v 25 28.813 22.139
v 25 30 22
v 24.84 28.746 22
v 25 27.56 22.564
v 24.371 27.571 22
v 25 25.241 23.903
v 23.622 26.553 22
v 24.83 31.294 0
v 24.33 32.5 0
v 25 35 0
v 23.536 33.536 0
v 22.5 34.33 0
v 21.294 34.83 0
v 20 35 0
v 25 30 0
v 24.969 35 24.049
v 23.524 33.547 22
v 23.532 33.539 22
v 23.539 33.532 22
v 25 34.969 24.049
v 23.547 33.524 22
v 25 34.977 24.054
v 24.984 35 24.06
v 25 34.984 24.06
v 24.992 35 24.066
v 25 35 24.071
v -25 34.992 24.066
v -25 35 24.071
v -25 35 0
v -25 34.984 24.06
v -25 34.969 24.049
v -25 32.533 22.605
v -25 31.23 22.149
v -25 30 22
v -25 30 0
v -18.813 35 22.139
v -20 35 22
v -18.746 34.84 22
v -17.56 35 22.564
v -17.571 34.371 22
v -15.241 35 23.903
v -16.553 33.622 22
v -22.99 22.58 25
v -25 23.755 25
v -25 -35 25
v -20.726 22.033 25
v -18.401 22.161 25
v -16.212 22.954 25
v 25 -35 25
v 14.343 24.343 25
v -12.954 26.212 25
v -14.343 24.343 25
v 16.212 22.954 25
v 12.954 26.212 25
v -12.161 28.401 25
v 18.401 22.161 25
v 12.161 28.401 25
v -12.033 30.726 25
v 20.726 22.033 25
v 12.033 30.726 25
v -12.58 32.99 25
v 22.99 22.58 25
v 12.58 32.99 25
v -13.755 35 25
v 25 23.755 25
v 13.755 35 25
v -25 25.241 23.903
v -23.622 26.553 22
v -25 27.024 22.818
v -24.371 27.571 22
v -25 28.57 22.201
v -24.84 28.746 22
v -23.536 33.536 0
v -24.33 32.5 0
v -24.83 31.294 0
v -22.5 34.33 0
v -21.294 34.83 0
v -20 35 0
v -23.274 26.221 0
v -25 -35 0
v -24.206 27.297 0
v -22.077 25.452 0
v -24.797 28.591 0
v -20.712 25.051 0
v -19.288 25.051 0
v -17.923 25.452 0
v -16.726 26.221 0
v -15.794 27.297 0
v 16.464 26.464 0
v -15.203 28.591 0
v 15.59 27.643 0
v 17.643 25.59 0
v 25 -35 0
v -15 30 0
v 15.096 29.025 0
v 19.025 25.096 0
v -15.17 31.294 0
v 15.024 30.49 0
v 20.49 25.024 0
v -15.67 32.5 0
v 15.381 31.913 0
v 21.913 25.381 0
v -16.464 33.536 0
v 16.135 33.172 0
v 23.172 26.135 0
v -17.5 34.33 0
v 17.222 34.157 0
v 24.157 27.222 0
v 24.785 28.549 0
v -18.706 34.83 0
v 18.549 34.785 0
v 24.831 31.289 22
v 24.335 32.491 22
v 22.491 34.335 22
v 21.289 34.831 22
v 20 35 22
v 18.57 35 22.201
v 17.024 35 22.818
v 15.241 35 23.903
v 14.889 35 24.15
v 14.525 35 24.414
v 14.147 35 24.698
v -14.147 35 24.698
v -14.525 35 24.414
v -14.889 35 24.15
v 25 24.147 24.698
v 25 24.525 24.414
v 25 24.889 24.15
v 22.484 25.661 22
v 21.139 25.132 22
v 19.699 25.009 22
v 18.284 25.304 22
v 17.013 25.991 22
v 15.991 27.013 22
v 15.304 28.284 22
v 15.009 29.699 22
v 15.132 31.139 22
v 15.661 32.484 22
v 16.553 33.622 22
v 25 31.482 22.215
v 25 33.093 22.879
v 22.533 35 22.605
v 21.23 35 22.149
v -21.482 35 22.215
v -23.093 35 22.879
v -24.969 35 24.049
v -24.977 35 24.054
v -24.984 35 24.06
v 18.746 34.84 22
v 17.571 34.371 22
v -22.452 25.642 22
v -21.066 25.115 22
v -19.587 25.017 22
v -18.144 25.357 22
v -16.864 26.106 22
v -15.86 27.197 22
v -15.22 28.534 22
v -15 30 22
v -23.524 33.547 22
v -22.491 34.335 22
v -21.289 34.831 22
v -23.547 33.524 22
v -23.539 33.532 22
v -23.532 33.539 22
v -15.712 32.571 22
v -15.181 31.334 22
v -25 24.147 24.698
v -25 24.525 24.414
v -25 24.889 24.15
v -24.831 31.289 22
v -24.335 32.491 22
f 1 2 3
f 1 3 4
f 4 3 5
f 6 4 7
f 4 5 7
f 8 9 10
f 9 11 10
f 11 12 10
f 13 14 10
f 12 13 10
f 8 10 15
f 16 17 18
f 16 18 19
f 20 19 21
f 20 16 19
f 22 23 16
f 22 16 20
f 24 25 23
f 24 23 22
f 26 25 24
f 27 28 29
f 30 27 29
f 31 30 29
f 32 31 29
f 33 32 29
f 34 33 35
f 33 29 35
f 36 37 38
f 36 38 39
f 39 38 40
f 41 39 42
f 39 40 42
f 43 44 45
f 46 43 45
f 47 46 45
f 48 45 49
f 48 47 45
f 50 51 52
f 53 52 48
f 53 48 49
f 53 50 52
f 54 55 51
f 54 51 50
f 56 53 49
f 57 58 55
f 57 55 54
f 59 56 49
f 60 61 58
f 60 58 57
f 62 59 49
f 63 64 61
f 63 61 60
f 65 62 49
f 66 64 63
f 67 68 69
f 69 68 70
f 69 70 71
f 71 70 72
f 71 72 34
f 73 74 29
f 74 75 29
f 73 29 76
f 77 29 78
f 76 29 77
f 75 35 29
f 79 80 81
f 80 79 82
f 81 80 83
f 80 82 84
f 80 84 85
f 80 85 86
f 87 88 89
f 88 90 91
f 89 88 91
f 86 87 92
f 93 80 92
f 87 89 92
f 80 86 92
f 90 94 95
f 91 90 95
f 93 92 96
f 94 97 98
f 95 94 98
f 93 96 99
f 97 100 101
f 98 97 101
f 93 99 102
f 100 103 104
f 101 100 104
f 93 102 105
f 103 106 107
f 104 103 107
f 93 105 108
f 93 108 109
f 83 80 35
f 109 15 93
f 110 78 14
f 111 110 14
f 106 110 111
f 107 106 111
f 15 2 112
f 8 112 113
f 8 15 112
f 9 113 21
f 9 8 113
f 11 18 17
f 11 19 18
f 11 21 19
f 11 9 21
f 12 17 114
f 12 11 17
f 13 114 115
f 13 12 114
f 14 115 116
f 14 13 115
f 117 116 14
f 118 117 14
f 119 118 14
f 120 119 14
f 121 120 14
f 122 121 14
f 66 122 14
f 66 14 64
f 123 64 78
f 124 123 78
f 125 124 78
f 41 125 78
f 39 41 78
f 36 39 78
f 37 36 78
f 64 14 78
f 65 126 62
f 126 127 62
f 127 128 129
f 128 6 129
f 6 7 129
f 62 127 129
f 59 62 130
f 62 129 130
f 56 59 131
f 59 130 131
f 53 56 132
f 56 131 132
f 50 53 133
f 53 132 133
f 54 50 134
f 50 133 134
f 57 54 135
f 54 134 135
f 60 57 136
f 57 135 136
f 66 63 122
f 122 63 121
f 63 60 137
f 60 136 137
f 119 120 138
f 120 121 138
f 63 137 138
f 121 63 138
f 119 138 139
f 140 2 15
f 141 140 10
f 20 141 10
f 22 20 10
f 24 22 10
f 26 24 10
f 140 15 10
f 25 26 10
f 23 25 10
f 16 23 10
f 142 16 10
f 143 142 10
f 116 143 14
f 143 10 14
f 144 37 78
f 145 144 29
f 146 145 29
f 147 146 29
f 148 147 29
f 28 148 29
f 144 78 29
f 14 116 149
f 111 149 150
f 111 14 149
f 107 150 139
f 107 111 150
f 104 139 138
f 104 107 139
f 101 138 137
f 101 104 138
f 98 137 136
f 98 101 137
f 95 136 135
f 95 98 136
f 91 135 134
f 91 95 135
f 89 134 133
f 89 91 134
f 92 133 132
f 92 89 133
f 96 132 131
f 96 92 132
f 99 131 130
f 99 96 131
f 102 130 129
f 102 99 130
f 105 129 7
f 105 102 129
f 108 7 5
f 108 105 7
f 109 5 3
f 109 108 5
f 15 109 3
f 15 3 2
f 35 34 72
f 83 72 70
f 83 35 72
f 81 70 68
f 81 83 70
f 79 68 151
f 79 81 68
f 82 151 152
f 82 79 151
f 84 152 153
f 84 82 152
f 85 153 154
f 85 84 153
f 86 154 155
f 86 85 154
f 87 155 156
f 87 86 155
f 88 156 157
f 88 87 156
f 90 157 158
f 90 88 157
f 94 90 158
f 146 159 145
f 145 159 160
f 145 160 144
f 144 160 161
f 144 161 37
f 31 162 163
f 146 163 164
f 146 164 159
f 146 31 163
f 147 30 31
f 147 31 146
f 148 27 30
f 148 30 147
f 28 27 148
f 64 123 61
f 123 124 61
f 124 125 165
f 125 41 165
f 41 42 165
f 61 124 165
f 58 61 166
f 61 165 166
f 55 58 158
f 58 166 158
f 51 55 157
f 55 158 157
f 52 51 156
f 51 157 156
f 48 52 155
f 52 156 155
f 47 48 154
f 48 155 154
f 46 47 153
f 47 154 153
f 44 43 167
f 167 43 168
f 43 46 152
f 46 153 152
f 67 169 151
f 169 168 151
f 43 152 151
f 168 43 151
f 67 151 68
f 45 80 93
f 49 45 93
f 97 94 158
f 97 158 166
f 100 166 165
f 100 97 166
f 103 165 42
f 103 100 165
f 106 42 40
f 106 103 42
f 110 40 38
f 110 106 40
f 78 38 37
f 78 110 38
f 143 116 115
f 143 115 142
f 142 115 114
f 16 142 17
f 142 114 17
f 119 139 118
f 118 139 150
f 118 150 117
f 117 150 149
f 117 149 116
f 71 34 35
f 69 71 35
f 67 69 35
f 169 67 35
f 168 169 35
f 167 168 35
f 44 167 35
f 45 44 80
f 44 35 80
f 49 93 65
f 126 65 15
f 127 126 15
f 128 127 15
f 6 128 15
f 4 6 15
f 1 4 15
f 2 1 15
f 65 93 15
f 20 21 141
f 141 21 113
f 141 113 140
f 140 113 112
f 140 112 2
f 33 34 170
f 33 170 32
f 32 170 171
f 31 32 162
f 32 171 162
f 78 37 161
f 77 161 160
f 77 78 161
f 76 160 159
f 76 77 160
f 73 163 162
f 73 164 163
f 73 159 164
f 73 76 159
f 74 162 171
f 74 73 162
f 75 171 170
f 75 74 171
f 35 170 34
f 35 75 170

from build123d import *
from build123d import SkipClean  # not in build123d's __all__

# Parameters (mm, degrees)
F1_DEPTH       = 25
F2_DEPTH       = 25.001
F3_T2_ANGLE    = 359.64
F3_T4_ANGLE    = 359.64
F4_T2_ANGLE    = 177.1758988834
F4_S1_T2_ANGLE = 177.1758988834


# Not quite as in the source:
# - a fillet or chamfer that OpenCascade refuses, or shapes differently, is made with other operations: its cross-section is extruded or revolved along the edge and cut away or added


with BuildPart() as f1:
    # F0 (on Top) → F1 (new body)
    with BuildSketch(Plane.XY):
        with BuildLine():
            Line((-20, 35), (-25, 35))
            Line((-25, 35), (-25, 30))
            ThreePointArc((-25, 30), (-23.5355339059, 33.5355339059), (-20, 35))
        make_face()
        with BuildLine():
            Line((19.9999999695, 35), (-20, 35))
            ThreePointArc((-20, 35), (-16.4644660941, 33.5355339059), (-15, 30))
            ThreePointArc((-15, 30), (-20, 25), (-25, 30))
            Line((-25, 30), (-25, -35))
            Line((-25, -35), (25, -35))
            Line((25, -35), (25, 30))
            ThreePointArc((25, 30), (16.4644661049, 26.4644660833), (19.9999999695, 35))
        make_face()
        with BuildLine():
            ThreePointArc((-15, 30), (-16.4644660941, 33.5355339059), (-20, 35))
            ThreePointArc((-20, 35), (-23.5355339059, 33.5355339059), (-25, 30))
            ThreePointArc((-25, 30), (-20, 25), (-15, 30))
        make_face()
        with BuildLine():
            Line((25, 35), (19.9999999695, 35))
            ThreePointArc((19.9999999695, 35), (23.5355338951, 33.5355339167), (25, 30))
            Line((25, 30), (25, 35))
        make_face()
        with BuildLine():
            ThreePointArc((25, 30), (23.5355338951, 33.5355339167), (19.9999999695, 35))
            ThreePointArc((19.9999999695, 35), (16.4644661049, 26.4644660833), (25, 30))
        make_face()
    extrude(amount=F1_DEPTH)

    # F0 (on Top) → F2 (cut, through all)
    with BuildSketch(Plane.XY):
        with BuildLine():
            ThreePointArc((-15, 30), (-16.4644660941, 33.5355339059), (-20, 35))
            ThreePointArc((-20, 35), (-23.5355339059, 33.5355339059), (-25, 30))
            ThreePointArc((-25, 30), (-20, 25), (-15, 30))
        make_face()
        with BuildLine():
            ThreePointArc((25, 30), (23.5355338951, 33.5355339167), (19.9999999695, 35))
            ThreePointArc((19.9999999695, 35), (16.4644661049, 26.4644660833), (25, 30))
        make_face()
    extrude(amount=F2_DEPTH, mode=Mode.SUBTRACT)

    # F3: chamfer of 3 on 2 edges, made by hand

    # F3_s1 → F3_t2 (revolve, cut)
    with BuildSketch(Plane(origin=(-5.062535292, 5.0944444589, 0), x_dir=(0, 0, 1), z_dir=(-0.7048818561, 0.7093247274, 0))):
        Polygon((25, 43.3329502316), (22, 40.3329502316), (25, 40.3329502316), align=None)
    revolve(axis=Axis((20, 30, 25), (0, 0, -1)), revolution_arc=F3_T2_ANGLE, mode=Mode.SUBTRACT)

    # F3_s3 → F3_t4 (revolve, cut)
    with BuildSketch(Plane(origin=(4.9368724732, 4.905950232, 0), x_dir=(0, 0, 1), z_dir=(-0.7093247296, -0.7048818539, 0))):
        Polygon((25, 43.377378966), (22, 40.377378966), (25, 40.377378966), align=None)
    revolve(axis=Axis((-20, 30, 25), (0, 0, -1)), revolution_arc=F3_T4_ANGLE, mode=Mode.SUBTRACT)

    # F4: chamfer of 3 on 1 edges, made by hand

    # F4_s1 → F4_t2 (revolve, cut)
    with BuildSketch(Plane(origin=(-24.4890834382, 25.7269036129, 0), x_dir=(0, 0, 1), z_dir=(0.6894672193, -0.7243168875, 0))):
        Polygon((22, -1.1976788275), (25, 1.8023211725), (25, -1.1976788275), align=None)
    with SkipClean():  # cleaning this boolean's faces spoils the solid; the shape is the same uncleaned
        revolve(axis=Axis((-20, 30, 25), (0, 0, -1)), revolution_arc=F4_T2_ANGLE, mode=Mode.SUBTRACT)

    # F4#s1: chamfer of 3 on 1 edges, made by hand

    # F4_s1_s1 → F4_s1_t2 (revolve, cut)
    with BuildSketch(Plane(origin=(25.4744815239, 24.2488064941, 0), x_dir=(0, 0, 1), z_dir=(-0.7243168854, -0.6894672215, 0))):
        Polygon((22, 12.940162133), (25, 15.940162133), (25, 12.940162133), align=None)
    with SkipClean():  # cleaning this boolean's faces spoils the solid; the shape is the same uncleaned
        revolve(axis=Axis((20, 30, 25), (0, 0, -1)), revolution_arc=F4_S1_T2_ANGLE, mode=Mode.SUBTRACT)


solid = f1.part
